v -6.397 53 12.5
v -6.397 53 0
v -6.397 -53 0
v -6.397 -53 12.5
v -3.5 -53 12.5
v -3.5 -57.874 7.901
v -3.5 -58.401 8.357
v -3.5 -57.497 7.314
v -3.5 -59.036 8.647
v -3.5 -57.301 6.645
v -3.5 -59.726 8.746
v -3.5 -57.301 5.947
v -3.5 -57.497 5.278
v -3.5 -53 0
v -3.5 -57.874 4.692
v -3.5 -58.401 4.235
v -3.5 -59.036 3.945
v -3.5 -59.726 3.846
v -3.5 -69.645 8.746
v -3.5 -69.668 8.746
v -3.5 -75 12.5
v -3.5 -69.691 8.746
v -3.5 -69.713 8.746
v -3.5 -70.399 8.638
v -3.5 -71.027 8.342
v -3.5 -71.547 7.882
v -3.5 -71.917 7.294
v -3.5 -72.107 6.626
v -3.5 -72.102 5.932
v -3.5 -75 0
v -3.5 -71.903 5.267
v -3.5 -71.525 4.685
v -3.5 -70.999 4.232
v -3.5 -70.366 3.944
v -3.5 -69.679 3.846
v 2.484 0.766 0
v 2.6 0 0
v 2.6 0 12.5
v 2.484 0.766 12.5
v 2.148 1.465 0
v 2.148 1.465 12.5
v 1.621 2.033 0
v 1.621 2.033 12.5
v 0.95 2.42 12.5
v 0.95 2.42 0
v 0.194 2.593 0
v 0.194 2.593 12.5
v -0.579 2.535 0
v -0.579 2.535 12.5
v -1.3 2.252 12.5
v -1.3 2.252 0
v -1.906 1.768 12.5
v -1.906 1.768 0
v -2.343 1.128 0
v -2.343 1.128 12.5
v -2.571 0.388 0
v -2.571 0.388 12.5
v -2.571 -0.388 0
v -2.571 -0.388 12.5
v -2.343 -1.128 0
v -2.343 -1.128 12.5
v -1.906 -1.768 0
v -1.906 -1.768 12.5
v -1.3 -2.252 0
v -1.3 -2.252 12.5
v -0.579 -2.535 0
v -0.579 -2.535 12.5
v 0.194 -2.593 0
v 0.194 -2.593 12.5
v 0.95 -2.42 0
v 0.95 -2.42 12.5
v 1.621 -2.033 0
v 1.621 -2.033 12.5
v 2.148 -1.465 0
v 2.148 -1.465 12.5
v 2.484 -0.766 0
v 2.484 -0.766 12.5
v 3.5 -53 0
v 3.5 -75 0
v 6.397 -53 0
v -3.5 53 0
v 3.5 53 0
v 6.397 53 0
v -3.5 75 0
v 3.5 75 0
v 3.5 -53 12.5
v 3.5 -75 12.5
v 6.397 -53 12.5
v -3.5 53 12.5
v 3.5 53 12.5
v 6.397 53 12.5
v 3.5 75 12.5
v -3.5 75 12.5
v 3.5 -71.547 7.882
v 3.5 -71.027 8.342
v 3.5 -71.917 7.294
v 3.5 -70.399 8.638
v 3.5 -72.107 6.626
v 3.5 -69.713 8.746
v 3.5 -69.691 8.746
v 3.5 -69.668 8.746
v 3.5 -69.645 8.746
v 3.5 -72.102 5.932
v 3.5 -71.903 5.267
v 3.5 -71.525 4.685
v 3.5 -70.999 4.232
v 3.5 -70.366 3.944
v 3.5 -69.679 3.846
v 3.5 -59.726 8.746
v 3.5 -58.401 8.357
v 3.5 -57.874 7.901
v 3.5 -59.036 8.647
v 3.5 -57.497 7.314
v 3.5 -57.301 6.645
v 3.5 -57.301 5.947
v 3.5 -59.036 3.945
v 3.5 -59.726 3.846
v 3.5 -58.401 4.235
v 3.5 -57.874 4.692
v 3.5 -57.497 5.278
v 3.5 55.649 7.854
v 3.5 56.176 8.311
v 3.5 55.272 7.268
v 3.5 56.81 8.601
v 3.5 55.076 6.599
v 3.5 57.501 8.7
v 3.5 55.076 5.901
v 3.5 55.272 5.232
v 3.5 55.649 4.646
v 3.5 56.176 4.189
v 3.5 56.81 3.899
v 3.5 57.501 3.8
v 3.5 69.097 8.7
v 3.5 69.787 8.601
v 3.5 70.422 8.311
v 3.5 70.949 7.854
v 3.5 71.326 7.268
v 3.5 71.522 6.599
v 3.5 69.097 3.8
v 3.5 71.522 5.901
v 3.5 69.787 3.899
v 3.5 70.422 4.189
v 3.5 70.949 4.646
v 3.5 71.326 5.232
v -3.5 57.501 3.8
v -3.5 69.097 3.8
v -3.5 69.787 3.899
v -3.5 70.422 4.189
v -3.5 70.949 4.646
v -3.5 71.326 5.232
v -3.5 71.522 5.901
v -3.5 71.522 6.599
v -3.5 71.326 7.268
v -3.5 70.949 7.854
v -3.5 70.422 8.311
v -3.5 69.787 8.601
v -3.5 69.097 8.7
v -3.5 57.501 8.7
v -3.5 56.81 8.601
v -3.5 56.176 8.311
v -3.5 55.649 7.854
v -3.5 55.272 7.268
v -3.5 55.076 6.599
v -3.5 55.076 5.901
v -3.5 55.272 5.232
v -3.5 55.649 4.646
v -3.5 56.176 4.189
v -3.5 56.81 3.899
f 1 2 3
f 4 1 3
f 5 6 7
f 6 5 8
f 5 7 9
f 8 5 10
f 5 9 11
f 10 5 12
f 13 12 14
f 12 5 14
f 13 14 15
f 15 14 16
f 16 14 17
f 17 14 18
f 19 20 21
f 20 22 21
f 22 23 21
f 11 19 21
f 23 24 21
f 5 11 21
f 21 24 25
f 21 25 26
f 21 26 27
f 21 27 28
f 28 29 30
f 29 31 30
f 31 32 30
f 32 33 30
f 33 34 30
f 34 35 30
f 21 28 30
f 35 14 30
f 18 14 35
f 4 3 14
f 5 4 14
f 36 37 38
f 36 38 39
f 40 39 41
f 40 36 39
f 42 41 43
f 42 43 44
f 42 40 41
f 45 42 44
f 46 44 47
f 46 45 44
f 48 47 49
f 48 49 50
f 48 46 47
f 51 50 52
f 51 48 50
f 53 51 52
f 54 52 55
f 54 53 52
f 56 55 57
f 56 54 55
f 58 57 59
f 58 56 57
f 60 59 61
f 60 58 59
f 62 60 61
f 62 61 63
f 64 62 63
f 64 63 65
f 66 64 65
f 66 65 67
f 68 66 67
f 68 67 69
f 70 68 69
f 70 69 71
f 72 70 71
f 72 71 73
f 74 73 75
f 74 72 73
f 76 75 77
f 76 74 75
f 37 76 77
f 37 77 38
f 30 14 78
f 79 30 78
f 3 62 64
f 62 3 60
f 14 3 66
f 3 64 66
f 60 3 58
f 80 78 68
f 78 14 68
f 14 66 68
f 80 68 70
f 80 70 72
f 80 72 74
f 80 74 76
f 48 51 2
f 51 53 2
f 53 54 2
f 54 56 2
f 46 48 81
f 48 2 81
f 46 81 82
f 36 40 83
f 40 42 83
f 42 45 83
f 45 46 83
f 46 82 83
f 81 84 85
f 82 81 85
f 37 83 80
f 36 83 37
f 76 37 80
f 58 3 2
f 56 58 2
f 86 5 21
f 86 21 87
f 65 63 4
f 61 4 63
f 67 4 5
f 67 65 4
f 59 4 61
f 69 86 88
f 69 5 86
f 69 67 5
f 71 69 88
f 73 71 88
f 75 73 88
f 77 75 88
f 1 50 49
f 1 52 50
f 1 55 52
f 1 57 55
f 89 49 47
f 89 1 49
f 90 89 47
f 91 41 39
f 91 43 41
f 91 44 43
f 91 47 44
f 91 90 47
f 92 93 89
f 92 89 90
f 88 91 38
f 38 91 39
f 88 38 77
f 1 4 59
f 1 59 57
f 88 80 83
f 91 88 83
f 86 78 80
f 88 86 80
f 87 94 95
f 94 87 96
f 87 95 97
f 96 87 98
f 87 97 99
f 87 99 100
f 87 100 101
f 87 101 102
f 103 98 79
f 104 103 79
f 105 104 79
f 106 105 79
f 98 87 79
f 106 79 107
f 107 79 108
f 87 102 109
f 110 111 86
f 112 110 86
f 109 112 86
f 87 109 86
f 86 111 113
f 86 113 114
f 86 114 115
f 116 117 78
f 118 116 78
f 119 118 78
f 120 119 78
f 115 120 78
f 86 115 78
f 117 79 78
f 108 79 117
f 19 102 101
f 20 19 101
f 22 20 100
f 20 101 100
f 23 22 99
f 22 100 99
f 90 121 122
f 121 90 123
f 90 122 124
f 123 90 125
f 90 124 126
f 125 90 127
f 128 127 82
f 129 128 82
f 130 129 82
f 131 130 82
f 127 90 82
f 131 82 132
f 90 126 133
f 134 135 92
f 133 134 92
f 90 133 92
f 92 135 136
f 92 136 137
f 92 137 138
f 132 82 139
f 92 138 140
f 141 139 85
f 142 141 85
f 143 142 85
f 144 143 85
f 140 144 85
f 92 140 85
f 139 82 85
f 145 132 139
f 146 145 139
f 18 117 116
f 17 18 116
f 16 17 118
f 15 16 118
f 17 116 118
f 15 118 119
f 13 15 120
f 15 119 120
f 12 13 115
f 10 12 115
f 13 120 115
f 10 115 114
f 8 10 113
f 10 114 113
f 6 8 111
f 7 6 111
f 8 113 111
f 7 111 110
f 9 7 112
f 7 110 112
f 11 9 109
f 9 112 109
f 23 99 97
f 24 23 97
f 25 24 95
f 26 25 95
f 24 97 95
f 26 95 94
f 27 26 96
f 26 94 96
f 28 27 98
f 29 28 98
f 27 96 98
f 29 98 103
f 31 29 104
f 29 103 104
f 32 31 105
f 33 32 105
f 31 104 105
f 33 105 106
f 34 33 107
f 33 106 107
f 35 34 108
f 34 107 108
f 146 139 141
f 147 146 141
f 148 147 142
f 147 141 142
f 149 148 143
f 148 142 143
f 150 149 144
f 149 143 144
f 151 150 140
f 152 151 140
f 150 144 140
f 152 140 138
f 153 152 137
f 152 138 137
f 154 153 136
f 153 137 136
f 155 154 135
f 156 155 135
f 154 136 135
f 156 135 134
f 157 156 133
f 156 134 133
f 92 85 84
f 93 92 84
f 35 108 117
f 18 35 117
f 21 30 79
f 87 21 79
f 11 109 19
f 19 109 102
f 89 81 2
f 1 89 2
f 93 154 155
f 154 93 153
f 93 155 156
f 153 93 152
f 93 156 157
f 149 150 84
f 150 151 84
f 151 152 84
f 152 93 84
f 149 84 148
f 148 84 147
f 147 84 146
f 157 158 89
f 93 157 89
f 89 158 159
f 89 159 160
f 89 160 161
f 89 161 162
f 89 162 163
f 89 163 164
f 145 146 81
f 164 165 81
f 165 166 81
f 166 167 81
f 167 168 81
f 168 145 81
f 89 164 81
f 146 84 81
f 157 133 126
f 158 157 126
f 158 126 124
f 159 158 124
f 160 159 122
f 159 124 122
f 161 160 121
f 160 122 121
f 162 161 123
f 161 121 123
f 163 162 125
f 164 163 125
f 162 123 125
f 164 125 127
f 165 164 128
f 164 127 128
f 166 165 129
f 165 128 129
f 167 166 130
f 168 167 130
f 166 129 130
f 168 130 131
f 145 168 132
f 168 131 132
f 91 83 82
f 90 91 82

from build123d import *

# Parameters (mm, degrees)
F0_R     = 2.6
F1_DEPTH = 12.5
F3_DEPTH = 25
F6_DEPTH = 25


with BuildPart() as f1:
    # F0 (on Top) → F1 (new body)
    with BuildSketch(Plane.XY):
        Polygon((3.5, -53), (6.3968370669, -53), (6.3968370669, 53), (3.5, 53), (3.5, 75), (-3.5, 75), (-3.5, 53), (-6.3968370669, 53), (-6.3968370669, -53), (-3.5, -53), (-3.5, -75), (3.5, -75), align=None)
        Circle(F0_R, mode=Mode.SUBTRACT)
    extrude(amount=F1_DEPTH)

    # F2 (on face) → F3 (cut)
    with BuildSketch(Plane.YZ.offset(3.5)):
        with BuildLine():
            Line((69.0972208977, 8.7), (57.500641793, 8.7))
            ThreePointArc((57.500641793, 8.7), (55.050641793, 6.25), (57.500641793, 3.8))
            Line((57.500641793, 3.8), (69.0972208977, 3.8))
            ThreePointArc((69.0972208977, 3.8), (71.5472208977, 6.25), (69.0972208977, 8.7))
        make_face()
    extrude(amount=-F3_DEPTH, mode=Mode.SUBTRACT)

    # F5 (on face) → F6 (cut)
    with BuildSketch(Plane.YZ.offset(3.5)):
        with BuildLine():
            Line((-69.7134453715, 8.7458659336), (-69.6451475877, 8.7458675667))
            ThreePointArc((-69.6451475877, 8.7458675667), (-69.6792964853, 8.7461047508), (-69.7134453715, 8.7458659336))
        make_face()
        with BuildLine():
            Line((-59.7258945025, 8.7461047508), (-69.6451475877, 8.7458675667))
            Line((-69.6451475877, 8.7458675667), (-69.7134453715, 8.7458659336))
            ThreePointArc((-69.7134453715, 8.7458659336), (-72.1291781969, 6.2790006), (-69.6792379022, 3.8461047515))
            Line((-69.6792379022, 3.8461047515), (-59.7258359194, 3.8461047515))
            ThreePointArc((-59.7258359194, 3.8461047515), (-57.2758359196, 6.2961340431), (-59.7258945025, 8.7461047508))
        make_face()
    extrude(amount=-F6_DEPTH, mode=Mode.SUBTRACT)


solid = f1.part
